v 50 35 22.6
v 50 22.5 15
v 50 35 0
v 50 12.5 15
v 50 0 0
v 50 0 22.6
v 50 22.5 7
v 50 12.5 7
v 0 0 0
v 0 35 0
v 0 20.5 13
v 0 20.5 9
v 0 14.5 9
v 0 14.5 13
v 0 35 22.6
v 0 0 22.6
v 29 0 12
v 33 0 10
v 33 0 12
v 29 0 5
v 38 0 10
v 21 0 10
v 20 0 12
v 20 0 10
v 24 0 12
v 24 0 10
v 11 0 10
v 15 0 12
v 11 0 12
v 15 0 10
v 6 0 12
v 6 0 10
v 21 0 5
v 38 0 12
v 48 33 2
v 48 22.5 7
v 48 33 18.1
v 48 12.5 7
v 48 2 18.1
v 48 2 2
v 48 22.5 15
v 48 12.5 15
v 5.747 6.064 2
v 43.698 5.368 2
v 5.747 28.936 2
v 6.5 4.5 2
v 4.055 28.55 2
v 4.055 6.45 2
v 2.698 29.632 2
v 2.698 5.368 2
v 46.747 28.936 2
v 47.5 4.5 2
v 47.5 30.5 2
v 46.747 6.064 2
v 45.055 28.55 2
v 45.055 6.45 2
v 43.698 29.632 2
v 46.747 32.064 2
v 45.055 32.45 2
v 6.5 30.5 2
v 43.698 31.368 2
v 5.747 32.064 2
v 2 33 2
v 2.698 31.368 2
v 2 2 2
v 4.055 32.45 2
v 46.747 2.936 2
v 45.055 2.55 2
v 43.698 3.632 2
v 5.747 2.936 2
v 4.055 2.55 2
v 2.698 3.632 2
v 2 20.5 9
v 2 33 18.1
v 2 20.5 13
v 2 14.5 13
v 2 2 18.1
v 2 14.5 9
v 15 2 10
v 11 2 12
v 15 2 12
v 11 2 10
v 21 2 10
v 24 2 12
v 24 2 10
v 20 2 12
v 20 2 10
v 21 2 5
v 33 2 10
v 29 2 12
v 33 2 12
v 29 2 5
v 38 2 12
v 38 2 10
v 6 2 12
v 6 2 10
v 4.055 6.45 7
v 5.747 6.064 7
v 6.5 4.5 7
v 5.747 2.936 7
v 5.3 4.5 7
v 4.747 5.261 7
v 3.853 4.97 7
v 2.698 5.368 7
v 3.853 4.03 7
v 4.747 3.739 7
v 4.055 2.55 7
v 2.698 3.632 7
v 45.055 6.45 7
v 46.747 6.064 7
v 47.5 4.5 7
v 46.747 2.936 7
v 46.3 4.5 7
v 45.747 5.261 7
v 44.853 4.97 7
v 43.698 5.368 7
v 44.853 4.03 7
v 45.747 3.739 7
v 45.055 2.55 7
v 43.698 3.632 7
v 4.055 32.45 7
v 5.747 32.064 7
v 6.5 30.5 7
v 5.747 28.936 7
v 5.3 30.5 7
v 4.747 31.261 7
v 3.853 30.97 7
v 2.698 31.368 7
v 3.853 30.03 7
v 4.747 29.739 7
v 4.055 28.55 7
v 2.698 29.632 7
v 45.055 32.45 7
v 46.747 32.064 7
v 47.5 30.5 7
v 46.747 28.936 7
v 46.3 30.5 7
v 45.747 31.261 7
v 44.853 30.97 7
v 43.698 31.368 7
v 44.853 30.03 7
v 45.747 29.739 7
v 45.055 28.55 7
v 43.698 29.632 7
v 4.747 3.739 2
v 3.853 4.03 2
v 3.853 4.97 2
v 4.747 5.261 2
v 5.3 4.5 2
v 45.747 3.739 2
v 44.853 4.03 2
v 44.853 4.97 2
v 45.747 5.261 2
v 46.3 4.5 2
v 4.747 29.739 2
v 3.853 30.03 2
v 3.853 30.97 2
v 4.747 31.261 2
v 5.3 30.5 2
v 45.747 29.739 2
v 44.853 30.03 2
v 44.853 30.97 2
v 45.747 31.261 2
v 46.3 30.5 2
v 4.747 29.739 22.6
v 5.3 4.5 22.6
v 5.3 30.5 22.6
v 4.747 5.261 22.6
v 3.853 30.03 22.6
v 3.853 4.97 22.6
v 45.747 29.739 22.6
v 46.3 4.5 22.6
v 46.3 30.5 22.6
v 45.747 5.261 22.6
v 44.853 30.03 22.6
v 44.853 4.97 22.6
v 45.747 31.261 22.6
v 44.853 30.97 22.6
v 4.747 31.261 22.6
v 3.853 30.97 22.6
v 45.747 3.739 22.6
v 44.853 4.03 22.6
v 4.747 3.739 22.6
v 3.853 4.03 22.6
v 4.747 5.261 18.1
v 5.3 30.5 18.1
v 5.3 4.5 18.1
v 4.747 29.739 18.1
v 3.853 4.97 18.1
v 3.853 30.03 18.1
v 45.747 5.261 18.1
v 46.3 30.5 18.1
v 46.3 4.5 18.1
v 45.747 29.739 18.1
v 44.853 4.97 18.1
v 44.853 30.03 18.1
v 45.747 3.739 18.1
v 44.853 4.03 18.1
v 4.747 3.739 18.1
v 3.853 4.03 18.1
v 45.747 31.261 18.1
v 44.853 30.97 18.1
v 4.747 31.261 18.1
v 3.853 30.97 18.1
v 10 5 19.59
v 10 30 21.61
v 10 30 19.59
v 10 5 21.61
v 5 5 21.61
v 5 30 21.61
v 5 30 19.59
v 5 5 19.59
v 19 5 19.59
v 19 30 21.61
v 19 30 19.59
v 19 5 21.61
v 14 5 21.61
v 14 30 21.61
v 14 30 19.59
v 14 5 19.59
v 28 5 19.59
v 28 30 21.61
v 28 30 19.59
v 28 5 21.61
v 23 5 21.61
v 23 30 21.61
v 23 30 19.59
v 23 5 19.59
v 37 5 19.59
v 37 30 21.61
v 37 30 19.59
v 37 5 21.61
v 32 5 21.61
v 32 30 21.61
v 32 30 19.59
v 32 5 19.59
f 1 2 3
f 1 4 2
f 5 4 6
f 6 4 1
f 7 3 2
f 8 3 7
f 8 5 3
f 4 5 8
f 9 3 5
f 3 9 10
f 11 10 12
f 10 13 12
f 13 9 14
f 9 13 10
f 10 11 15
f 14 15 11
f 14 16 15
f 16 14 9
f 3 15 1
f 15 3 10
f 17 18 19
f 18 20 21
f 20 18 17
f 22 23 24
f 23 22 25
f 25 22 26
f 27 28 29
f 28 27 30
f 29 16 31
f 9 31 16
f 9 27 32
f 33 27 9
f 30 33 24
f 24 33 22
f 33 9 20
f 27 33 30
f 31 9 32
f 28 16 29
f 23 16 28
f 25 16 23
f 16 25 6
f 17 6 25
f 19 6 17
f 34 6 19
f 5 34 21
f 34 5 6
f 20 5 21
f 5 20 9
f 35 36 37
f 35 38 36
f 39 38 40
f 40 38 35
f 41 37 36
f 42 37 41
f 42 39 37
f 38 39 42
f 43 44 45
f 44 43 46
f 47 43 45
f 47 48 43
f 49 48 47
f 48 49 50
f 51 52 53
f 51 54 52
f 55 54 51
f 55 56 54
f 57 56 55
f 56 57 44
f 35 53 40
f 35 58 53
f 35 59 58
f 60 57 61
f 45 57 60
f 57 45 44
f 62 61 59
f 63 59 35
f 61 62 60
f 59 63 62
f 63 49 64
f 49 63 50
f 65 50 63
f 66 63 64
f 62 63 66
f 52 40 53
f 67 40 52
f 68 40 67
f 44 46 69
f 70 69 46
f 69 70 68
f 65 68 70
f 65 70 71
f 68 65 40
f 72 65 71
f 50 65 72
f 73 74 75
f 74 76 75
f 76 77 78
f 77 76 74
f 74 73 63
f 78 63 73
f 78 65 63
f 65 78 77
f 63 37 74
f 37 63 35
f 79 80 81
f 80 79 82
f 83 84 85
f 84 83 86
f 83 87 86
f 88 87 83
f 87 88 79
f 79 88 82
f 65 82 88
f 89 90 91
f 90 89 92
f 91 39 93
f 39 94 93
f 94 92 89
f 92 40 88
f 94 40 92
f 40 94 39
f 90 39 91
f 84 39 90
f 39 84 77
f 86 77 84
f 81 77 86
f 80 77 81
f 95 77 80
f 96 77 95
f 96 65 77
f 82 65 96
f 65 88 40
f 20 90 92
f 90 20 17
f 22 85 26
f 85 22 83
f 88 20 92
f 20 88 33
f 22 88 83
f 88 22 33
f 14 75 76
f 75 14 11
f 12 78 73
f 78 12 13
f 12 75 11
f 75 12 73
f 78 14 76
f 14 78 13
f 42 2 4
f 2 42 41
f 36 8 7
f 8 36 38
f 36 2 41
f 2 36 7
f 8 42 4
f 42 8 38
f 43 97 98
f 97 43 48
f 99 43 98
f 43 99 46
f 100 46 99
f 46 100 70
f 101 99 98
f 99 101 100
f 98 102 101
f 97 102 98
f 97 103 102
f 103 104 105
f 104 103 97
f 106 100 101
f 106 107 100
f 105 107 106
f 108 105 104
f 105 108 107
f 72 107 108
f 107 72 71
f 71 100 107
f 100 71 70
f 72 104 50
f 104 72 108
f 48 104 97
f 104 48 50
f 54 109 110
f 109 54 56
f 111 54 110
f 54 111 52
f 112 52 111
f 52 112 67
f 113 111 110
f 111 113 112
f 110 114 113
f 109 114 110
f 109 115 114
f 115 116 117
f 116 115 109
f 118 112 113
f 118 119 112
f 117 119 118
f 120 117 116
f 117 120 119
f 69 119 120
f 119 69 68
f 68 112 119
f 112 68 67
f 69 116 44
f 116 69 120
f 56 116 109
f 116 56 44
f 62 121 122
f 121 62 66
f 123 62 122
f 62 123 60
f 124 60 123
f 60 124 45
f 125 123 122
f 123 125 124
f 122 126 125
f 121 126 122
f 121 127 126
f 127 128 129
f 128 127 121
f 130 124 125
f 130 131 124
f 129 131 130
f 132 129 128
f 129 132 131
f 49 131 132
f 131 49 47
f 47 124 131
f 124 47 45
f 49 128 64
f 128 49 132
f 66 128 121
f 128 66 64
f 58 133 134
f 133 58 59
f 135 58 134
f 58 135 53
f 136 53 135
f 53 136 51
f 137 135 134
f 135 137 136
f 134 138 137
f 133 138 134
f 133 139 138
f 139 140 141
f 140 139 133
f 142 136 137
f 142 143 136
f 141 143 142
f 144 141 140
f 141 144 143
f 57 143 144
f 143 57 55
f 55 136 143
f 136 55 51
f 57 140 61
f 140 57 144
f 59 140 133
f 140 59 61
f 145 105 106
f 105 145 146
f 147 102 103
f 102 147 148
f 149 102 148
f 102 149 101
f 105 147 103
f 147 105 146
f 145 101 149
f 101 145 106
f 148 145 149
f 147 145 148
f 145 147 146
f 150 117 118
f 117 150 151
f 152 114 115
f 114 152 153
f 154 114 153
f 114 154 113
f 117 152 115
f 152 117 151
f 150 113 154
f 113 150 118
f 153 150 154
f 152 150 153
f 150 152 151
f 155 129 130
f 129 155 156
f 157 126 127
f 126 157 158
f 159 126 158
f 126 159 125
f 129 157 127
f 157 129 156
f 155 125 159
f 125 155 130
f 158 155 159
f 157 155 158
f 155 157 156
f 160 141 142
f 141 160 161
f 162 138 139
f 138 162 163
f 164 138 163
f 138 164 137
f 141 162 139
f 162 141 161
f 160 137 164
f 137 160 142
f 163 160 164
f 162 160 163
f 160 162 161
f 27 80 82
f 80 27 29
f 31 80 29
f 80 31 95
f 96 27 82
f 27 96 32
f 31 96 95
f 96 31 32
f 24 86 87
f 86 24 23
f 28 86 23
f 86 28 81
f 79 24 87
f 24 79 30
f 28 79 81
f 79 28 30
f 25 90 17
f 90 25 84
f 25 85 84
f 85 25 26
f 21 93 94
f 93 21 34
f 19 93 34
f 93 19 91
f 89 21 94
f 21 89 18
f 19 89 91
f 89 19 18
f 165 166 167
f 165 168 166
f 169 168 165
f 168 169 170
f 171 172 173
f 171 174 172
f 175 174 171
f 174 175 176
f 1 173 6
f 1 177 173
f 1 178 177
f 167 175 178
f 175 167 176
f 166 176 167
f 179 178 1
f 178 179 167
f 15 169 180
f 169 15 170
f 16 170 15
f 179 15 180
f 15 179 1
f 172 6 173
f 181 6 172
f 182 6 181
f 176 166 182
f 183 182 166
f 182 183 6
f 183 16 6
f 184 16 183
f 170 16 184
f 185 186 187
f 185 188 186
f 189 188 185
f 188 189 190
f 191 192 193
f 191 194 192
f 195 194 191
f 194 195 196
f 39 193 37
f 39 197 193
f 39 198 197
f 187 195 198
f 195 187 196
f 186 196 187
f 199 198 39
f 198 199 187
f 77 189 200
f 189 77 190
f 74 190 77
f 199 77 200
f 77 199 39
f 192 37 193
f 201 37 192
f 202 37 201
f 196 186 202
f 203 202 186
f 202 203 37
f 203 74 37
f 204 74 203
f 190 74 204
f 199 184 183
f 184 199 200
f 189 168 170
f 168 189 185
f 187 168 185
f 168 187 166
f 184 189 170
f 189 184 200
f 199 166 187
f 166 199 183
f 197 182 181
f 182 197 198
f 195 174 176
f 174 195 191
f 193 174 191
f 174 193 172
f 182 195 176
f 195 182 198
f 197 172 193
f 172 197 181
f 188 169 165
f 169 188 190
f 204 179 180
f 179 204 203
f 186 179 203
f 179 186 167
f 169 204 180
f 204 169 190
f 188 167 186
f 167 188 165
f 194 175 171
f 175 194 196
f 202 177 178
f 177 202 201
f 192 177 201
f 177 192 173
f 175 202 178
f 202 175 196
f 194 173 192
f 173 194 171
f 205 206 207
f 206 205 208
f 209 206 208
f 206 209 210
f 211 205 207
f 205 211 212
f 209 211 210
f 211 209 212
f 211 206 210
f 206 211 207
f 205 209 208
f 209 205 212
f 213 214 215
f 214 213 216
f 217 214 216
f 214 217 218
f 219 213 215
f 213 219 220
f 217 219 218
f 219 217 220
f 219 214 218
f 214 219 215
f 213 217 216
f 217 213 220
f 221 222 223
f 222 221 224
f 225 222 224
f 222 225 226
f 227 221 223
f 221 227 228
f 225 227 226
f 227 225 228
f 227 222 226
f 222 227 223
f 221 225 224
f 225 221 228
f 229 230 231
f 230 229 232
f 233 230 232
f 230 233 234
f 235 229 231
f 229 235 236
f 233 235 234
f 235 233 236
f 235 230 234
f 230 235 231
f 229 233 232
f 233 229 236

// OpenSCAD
union() {
	color(alpha = 1.0, c = "#2196F3") {
		difference() {
			union() {
				difference() {
					cube(size = [50.0, 35.0, 19.6]);
					translate(v = [2.0, 2.0, 2.0]) {
						cube(size = [46.0, 31.0, 18.6]);
					}
					translate(v = [21.0, -1, 5.0]) {
						cube(size = [8, 4.0, 5]);
					}
					translate(v = [-1, 14.5, 9.0]) {
						cube(size = [4.0, 6, 4]);
					}
					translate(v = [47.0, 12.5, 7.0]) {
						cube(size = [4.0, 10, 8]);
					}
				}
				union() {
					translate(v = [4.5, 4.5, 2.0]) {
						cylinder(h = 5.0, r = 2.0);
					}
					translate(v = [45.5, 4.5, 2.0]) {
						cylinder(h = 5.0, r = 2.0);
					}
					translate(v = [4.5, 30.5, 2.0]) {
						cylinder(h = 5.0, r = 2.0);
					}
					translate(v = [45.5, 30.5, 2.0]) {
						cylinder(h = 5.0, r = 2.0);
					}
				}
			}
			union() {
				translate(v = [4.5, 4.5, 2.0]) {
					cylinder(h = 6.0, r = 0.8);
				}
				translate(v = [45.5, 4.5, 2.0]) {
					cylinder(h = 6.0, r = 0.8);
				}
				translate(v = [4.5, 30.5, 2.0]) {
					cylinder(h = 6.0, r = 0.8);
				}
				translate(v = [45.5, 30.5, 2.0]) {
					cylinder(h = 6.0, r = 0.8);
				}
			}
			union() {
				union() {
					union() {
						union() {
							union();
							translate(v = [6.0, -1, 10.0]) {
								cube(size = [5, 4.0, 2]);
							}
						}
						translate(v = [15.0, -1, 10.0]) {
							cube(size = [5, 4.0, 2]);
						}
					}
					translate(v = [24.0, -1, 10.0]) {
						cube(size = [5, 4.0, 2]);
					}
				}
				translate(v = [33.0, -1, 10.0]) {
					cube(size = [5, 4.0, 2]);
				}
			}
		}
	}
	color(alpha = 1.0, c = "#90CAF9") {
		difference() {
			union() {
				translate(v = [0, 0, 19.6]) {
					cube(size = [50.0, 35.0, 3.0]);
				}
				translate(v = [2.0, 2.0, 18.1]) {
					cube(size = [46.0, 31.0, 4.5]);
				}
				union() {
					translate(v = [4.5, 4.5, 18.1]) {
						cylinder(h = 4.5, r = 2.0);
					}
					translate(v = [45.5, 4.5, 18.1]) {
						cylinder(h = 4.5, r = 2.0);
					}
					translate(v = [4.5, 30.5, 18.1]) {
						cylinder(h = 4.5, r = 2.0);
					}
					translate(v = [45.5, 30.5, 18.1]) {
						cylinder(h = 4.5, r = 2.0);
					}
				}
			}
			union() {
				translate(v = [4.5, 4.5, 18.1]) {
					cylinder(h = 5.5, r = 0.8);
				}
				translate(v = [45.5, 4.5, 18.1]) {
					cylinder(h = 5.5, r = 0.8);
				}
				translate(v = [4.5, 30.5, 18.1]) {
					cylinder(h = 5.5, r = 0.8);
				}
				translate(v = [45.5, 30.5, 18.1]) {
					cylinder(h = 5.5, r = 0.8);
				}
			}
			union() {
				union() {
					union() {
						union() {
							union();
							translate(v = [5.0, 5.0, 19.59]) {
								cube(size = [5, 25.0, 2.02]);
							}
						}
						translate(v = [14.0, 5.0, 19.59]) {
							cube(size = [5, 25.0, 2.02]);
						}
					}
					translate(v = [23.0, 5.0, 19.59]) {
						cube(size = [5, 25.0, 2.02]);
					}
				}
				translate(v = [32.0, 5.0, 19.59]) {
					cube(size = [5, 25.0, 2.02]);
				}
			}
		}
	}
}
